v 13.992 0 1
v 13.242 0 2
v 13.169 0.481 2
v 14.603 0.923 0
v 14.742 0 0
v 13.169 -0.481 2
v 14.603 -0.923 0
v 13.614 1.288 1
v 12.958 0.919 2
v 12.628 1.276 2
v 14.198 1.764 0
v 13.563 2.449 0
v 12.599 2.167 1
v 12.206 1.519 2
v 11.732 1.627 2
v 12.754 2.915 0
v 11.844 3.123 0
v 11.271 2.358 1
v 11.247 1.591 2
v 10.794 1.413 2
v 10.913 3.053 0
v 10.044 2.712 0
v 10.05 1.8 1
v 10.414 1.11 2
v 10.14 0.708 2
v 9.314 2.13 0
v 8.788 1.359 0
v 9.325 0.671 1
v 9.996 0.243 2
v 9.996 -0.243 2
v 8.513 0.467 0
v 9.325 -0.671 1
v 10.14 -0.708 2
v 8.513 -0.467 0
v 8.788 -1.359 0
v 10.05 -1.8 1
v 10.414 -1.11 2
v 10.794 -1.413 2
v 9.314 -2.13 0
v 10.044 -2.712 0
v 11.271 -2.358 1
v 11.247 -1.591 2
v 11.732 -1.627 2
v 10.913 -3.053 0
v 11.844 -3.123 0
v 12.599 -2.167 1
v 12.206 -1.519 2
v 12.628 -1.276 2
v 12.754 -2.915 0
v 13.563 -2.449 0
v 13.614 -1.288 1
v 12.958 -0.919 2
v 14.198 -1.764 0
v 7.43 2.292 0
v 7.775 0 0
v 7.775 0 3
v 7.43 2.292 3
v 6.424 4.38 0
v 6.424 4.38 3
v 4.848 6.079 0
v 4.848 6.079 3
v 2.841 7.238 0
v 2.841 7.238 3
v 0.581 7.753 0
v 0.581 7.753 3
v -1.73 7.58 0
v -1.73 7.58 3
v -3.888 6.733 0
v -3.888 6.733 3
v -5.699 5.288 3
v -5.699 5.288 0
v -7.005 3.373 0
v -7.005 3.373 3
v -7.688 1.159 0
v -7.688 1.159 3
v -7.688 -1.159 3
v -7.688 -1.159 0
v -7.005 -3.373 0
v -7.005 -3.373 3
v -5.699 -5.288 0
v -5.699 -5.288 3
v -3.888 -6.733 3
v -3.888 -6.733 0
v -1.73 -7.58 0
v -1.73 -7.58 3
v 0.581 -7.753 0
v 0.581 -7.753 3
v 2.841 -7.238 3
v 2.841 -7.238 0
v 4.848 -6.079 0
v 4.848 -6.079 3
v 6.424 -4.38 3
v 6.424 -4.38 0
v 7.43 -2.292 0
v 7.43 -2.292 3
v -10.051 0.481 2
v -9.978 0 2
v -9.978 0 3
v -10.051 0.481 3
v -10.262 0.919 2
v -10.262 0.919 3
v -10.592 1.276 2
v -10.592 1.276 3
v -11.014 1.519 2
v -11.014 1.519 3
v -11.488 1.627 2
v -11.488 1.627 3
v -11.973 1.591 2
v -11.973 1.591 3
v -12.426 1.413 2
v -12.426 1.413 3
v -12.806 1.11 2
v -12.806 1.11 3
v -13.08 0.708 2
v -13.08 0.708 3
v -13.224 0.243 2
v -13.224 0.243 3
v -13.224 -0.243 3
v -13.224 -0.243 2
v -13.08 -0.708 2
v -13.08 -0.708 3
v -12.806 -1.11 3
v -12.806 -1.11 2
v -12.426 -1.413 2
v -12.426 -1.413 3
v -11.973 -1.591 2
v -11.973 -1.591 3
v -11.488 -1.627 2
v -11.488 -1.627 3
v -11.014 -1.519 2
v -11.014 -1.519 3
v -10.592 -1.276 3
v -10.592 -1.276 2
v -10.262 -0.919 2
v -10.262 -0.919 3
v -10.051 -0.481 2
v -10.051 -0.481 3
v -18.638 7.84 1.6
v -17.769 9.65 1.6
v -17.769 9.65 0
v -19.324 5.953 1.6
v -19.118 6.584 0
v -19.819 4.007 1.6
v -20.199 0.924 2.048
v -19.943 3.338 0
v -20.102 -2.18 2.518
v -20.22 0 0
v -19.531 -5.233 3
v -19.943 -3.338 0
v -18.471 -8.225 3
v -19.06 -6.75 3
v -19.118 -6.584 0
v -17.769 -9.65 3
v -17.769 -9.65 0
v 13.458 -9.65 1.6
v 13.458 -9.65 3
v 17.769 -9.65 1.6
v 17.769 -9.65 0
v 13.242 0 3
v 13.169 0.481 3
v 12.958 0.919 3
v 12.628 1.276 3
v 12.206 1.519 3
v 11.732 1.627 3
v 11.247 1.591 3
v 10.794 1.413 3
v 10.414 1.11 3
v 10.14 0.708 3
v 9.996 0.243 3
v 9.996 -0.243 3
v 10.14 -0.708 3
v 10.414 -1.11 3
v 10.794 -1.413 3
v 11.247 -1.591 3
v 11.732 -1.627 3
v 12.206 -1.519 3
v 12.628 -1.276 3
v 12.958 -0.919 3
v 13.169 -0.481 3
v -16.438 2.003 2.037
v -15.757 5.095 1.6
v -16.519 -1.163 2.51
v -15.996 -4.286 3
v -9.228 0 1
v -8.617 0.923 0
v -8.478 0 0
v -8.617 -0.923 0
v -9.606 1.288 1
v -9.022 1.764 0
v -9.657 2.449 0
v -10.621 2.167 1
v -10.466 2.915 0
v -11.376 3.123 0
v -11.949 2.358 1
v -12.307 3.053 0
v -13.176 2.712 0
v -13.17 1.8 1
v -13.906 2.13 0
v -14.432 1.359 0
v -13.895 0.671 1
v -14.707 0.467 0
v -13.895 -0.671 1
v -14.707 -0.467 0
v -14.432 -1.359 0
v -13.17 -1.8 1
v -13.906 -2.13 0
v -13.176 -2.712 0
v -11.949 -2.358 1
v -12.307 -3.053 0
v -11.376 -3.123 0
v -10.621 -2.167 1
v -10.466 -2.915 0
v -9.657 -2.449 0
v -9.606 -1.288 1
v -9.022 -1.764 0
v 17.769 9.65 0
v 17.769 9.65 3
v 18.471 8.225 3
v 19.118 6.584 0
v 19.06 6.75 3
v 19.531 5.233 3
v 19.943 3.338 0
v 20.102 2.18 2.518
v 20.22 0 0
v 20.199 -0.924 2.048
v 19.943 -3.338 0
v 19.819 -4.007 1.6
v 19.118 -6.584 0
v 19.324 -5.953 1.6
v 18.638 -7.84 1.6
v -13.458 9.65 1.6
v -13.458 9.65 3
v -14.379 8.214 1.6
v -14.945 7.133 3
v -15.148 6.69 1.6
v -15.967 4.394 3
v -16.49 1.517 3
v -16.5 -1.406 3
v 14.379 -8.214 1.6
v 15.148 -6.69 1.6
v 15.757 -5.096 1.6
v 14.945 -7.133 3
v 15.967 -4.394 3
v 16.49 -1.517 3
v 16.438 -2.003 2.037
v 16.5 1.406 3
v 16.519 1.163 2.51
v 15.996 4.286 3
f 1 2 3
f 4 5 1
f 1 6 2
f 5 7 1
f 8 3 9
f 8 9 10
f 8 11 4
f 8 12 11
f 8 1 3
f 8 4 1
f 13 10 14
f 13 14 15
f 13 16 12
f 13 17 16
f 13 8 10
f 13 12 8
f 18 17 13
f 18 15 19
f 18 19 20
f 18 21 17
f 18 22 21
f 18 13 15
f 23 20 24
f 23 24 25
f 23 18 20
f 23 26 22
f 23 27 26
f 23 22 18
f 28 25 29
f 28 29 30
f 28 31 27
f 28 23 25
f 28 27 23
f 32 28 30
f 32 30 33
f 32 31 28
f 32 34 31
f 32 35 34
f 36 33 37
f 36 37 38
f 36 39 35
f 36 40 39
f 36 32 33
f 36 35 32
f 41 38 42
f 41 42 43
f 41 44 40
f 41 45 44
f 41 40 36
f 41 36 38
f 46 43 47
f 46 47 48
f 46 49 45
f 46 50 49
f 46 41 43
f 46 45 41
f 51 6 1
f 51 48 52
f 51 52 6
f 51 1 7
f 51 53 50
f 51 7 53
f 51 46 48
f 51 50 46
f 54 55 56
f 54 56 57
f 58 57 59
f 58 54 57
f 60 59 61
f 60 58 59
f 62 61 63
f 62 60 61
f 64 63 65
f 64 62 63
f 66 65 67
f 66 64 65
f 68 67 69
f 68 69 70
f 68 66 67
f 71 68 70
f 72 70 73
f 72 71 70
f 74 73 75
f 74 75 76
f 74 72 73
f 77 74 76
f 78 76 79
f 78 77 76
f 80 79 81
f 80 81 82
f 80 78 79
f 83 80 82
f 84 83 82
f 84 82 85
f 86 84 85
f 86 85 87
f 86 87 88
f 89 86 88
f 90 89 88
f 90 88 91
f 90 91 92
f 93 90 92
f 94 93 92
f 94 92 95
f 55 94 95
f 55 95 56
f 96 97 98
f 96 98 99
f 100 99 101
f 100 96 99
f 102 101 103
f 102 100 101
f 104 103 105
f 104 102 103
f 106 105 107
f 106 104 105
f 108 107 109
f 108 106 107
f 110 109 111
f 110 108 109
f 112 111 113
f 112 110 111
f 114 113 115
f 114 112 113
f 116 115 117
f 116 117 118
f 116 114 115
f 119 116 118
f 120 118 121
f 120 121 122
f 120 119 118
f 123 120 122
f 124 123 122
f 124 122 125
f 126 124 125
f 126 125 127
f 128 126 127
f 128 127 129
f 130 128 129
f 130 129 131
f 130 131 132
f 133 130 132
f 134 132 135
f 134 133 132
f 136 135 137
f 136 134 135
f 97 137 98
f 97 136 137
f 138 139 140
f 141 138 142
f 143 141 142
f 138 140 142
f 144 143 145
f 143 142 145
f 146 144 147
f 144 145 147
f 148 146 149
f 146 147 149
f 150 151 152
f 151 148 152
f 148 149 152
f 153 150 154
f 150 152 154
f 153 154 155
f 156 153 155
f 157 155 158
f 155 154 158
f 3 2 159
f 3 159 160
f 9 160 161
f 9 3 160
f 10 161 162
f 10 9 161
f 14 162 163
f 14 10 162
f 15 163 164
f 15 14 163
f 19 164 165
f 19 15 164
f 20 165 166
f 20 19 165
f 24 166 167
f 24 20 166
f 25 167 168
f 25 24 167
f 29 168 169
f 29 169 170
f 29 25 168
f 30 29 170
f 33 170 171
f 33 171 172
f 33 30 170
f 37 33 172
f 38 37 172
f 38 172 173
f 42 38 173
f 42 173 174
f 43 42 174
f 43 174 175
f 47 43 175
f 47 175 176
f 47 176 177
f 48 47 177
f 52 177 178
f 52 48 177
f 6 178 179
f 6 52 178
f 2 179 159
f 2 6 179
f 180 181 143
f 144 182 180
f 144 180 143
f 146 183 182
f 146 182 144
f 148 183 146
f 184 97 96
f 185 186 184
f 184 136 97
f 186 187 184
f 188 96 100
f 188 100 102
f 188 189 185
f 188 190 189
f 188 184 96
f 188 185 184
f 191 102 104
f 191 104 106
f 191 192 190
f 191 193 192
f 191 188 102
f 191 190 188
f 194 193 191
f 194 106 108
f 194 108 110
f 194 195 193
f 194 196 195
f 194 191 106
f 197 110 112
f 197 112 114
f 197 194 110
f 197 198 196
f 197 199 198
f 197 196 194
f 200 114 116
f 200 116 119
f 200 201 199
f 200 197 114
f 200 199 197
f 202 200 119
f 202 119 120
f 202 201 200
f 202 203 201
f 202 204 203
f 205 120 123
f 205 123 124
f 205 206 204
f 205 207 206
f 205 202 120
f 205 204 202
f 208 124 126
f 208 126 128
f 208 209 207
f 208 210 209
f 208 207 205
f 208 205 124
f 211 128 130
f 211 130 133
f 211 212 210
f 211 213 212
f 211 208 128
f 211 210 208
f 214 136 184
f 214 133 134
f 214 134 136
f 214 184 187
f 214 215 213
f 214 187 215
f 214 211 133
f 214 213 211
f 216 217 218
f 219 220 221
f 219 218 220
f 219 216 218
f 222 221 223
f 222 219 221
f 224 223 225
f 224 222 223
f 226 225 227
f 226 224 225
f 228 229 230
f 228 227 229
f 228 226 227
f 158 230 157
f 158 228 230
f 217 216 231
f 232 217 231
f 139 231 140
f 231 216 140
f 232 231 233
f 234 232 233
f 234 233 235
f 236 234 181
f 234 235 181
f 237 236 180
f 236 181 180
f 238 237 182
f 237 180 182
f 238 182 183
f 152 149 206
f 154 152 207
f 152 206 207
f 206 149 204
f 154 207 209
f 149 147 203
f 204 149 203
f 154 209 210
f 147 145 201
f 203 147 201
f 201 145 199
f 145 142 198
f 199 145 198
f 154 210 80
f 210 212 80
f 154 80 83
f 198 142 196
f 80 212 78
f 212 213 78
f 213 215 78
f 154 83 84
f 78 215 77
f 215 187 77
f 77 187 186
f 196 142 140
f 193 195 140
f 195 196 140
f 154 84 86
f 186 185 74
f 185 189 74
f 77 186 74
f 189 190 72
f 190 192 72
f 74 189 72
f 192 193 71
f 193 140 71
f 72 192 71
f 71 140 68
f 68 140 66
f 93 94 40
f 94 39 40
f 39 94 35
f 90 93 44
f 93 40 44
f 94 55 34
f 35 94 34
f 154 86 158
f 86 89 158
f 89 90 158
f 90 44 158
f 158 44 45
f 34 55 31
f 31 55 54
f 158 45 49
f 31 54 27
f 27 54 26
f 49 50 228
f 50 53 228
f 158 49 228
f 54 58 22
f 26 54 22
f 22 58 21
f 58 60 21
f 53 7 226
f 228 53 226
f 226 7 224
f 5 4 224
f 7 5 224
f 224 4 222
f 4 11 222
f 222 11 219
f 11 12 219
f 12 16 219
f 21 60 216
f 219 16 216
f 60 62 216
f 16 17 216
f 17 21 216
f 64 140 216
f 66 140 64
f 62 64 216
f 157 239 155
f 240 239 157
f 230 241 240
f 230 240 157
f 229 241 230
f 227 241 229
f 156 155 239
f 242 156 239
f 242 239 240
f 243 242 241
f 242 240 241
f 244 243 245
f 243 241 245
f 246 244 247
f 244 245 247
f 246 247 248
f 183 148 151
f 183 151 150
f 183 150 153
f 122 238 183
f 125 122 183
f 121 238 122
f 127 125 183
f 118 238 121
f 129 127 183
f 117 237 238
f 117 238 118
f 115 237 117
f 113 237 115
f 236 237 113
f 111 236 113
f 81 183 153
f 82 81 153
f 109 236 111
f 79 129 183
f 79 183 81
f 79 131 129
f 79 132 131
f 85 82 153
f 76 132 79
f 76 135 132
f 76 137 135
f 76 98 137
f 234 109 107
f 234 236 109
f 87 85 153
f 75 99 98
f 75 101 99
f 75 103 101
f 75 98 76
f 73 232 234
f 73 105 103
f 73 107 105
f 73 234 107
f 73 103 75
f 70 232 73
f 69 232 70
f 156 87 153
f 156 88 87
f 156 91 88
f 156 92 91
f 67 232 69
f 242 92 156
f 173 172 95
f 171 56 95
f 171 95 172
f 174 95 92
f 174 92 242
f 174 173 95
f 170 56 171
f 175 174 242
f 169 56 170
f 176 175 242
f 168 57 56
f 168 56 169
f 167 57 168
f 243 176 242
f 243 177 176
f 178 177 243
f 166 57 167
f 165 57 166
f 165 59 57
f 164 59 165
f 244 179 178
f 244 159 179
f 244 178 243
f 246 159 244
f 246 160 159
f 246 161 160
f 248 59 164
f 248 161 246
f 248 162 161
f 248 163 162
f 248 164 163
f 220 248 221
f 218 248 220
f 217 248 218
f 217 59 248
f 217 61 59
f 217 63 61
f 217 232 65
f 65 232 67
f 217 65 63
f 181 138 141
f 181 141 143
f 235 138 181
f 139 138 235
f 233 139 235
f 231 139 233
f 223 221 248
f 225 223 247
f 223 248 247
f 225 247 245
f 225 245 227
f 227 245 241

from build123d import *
from OCP.BRepFilletAPI import BRepFilletAPI_MakeChamfer

# Parameters (mm, degrees)
SKETCH1_R           = 7.774999999999999
SKETCH1_R_2         = 1.6319499986664014
BOSS_EXTRUDE1_DEPTH = 3
SKETCH1_3_R         = 1.6319499986664014
SKETCH1_3_R_2       = 7.774999999999999
BOSS_EXTRUDE2_DEPTH = 1.6
CHAMFER1_SIZE       = 2
CHAMFER1_SIZE2      = 1.5
CHAMFER2_SIZE2      = 1.4
CHAMFER2_SIZE       = 9
CHAMFER3_SIZE       = 1.4
CHAMFER3_SIZE_2     = 9


# Some blends are built 0.0001 mm under size
with BuildPart() as part:
    # Sketch1 → Boss-Extrude1 (new body)
    with BuildSketch(Plane.XY):
        with BuildLine():
            Line((-15.995731683346964, -4.286043386897756), (-19.531020207564957, -5.233321091972986))
            ThreePointArc((-19.53102020756496, -5.233321091972988), (-18.780139119855487, -7.49364895353884), (-17.76867749721403, -9.650000000000002))
            Line((-17.76867749721403, -9.65), (13.457752412643053, -9.650000000000004))
            ThreePointArc((13.457752412643053, -9.650000000000004), (16.29203049556925, -2.967042691206455), (15.995731683346978, 4.286043386897719))
            Line((15.995731683346953, 4.286043386897752), (19.531020207564957, 5.233321091972986))
            ThreePointArc((19.531020207564957, 5.233321091972985), (18.78013911985548, 7.493648953538841), (17.768677497214025, 9.650000000000002))
            Line((17.76867749721402, 9.650000000000002), (-13.457752412643053, 9.650000000000002))
            ThreePointArc((-13.457752412643051, 9.650000000000002), (-16.292030495569243, 2.967042691206453), (-15.995731683346973, -4.286043386897722))
        make_face()
        Circle(SKETCH1_R, mode=Mode.SUBTRACT)
        with Locations((11.610000000000001, 2.84e-15)):
            Circle(SKETCH1_R_2, mode=Mode.SUBTRACT)
        with Locations((-11.609999999999998, 0)):
            Circle(SKETCH1_R_2, mode=Mode.SUBTRACT)
    extrude(amount=BOSS_EXTRUDE1_DEPTH)

    # Sketch1<3> → Boss-Extrude2 (add)
    with BuildSketch(Plane.XY):
        with BuildLine():
            Line((-17.768677497214025, -9.649999999999999), (17.76867749721402, -9.650000000000002))
            ThreePointArc((17.76867749721402, -9.650000000000002), (20.22, 0), (17.76867749721402, 9.650000000000002))
            Line((17.76867749721402, 9.650000000000002), (-17.768677497214025, 9.649999999999999))
            ThreePointArc((-17.768677497214025, 9.649999999999999), (-20.220000000000002, 2.48e-15), (-17.768677497214025, -9.649999999999999))
        make_face()
        with Locations((-11.609999999999998, 0)):
            Circle(SKETCH1_3_R, mode=Mode.SUBTRACT)
        with Locations((11.610000000000001, 2.84e-15)):
            Circle(SKETCH1_3_R, mode=Mode.SUBTRACT)
        Circle(SKETCH1_3_R_2, mode=Mode.SUBTRACT)
    extrude(amount=BOSS_EXTRUDE2_DEPTH)

    # Chamfer1: one chamfer whose edges measure the first distance from different faces: ONE call of the kernel's chamfer builder (chamfer() names one face for all edges)
    chamfer1_edges_1 = [part.edges().sort_by_distance(p)[0] for p in [
        (-13.2419499986664, 2e-16, 0),
    ]]
    chamfer1_side_1 = [part.faces().sort_by_distance(p)[0] for p in [
        (-13.2419499986664, 2e-16, 1.5),
    ]]
    chamfer1_edges_2 = [part.edges().sort_by_distance(p)[0] for p in [
        (9.9780500013336, 3.04e-15, 0),
    ]]
    chamfer1_side_2 = [part.faces().sort_by_distance(p)[0] for p in [
        (9.9780500013336, 3.04e-15, 1.5),
    ]]
    chamfer1 = BRepFilletAPI_MakeChamfer(part.part.solid().wrapped)
    for e in chamfer1_edges_1:
        chamfer1.Add(CHAMFER1_SIZE, CHAMFER1_SIZE2, e.wrapped, chamfer1_side_1[0].wrapped)  # the first distance lies on this face
    for e in chamfer1_edges_2:
        chamfer1.Add(CHAMFER1_SIZE, CHAMFER1_SIZE2, e.wrapped, chamfer1_side_2[0].wrapped)  # the first distance lies on this face
    add(Compound.cast(chamfer1.Shape()), mode=Mode.REPLACE)

    # Chamfer2
    chamfer2_edges = [part.edges().sort_by_distance(p)[0] for p in [
        (-17.763375945455962, -4.759682239435371, 1.6),
    ]]
    chamfer2_side = [part.faces().sort_by_distance(p)[0] for p in [
        (-17.770622878718832, -4.732636316299277, 1.6),
    ]]
    chamfer(chamfer2_edges, length=CHAMFER2_SIZE - 0.0001, length2=CHAMFER2_SIZE2 - 0.0001, reference=chamfer2_side[0])  # a hair under: the kernel refuses the full size

    # Chamfer3
    # the kernel refuses this chamfer: 9, 1.4 mm, written as the material it adds along each edge
    with BuildSketch(Plane(origin=(-6.596997055985572, -1.7676600336218398, 1.6), x_dir=(-0.06145306059893889, 0.22934594443584813, 0.9714030878651004), z_dir=(0.9659258262890681, 0.2588190451025218, 0))) as chamfer3_piece_1_section:
        Polygon((CHAMFER3_SIZE * 0.971403087865, CHAMFER3_SIZE * 0.237436393348), (-CHAMFER3_SIZE_2 * 0.237436393348, CHAMFER3_SIZE_2 * 0.971403087865), (0, 0), align=None)
    chamfer3_piece_1 = extrude(amount=50.43942782859462, mode=Mode.PRIVATE)
    chamfer3_piece_1 = split(chamfer3_piece_1, bisect_by=Plane(origin=(18.152512128886663, 1.3968714371036275, 3), z_dir=(0, 0, -1)), keep=Keep.TOP, mode=Mode.PRIVATE)
    chamfer3_piece_1 = chamfer3_piece_1 & Plane(origin=(-9.0949e-13, -3.5172e-13, 1.9557710563894077), x_dir=(0.9659258262890668, 0.2588190451025265, 0), z_dir=(0, 0, -1)) * Cylinder(20.22000000000097, 136, mode=Mode.PRIVATE)
    chamfer3_piece_1 = chamfer3_piece_1 - Plane(origin=(2.665e-14, -4.11e-15, 1.9557710563894077), x_dir=(0.8126662084929376, -0.5827294685990347, 0), z_dir=(0, 0, -1)) * Cylinder(16.559999999999974, 136, mode=Mode.PRIVATE)
    add(chamfer3_piece_1)


solid = part.part
